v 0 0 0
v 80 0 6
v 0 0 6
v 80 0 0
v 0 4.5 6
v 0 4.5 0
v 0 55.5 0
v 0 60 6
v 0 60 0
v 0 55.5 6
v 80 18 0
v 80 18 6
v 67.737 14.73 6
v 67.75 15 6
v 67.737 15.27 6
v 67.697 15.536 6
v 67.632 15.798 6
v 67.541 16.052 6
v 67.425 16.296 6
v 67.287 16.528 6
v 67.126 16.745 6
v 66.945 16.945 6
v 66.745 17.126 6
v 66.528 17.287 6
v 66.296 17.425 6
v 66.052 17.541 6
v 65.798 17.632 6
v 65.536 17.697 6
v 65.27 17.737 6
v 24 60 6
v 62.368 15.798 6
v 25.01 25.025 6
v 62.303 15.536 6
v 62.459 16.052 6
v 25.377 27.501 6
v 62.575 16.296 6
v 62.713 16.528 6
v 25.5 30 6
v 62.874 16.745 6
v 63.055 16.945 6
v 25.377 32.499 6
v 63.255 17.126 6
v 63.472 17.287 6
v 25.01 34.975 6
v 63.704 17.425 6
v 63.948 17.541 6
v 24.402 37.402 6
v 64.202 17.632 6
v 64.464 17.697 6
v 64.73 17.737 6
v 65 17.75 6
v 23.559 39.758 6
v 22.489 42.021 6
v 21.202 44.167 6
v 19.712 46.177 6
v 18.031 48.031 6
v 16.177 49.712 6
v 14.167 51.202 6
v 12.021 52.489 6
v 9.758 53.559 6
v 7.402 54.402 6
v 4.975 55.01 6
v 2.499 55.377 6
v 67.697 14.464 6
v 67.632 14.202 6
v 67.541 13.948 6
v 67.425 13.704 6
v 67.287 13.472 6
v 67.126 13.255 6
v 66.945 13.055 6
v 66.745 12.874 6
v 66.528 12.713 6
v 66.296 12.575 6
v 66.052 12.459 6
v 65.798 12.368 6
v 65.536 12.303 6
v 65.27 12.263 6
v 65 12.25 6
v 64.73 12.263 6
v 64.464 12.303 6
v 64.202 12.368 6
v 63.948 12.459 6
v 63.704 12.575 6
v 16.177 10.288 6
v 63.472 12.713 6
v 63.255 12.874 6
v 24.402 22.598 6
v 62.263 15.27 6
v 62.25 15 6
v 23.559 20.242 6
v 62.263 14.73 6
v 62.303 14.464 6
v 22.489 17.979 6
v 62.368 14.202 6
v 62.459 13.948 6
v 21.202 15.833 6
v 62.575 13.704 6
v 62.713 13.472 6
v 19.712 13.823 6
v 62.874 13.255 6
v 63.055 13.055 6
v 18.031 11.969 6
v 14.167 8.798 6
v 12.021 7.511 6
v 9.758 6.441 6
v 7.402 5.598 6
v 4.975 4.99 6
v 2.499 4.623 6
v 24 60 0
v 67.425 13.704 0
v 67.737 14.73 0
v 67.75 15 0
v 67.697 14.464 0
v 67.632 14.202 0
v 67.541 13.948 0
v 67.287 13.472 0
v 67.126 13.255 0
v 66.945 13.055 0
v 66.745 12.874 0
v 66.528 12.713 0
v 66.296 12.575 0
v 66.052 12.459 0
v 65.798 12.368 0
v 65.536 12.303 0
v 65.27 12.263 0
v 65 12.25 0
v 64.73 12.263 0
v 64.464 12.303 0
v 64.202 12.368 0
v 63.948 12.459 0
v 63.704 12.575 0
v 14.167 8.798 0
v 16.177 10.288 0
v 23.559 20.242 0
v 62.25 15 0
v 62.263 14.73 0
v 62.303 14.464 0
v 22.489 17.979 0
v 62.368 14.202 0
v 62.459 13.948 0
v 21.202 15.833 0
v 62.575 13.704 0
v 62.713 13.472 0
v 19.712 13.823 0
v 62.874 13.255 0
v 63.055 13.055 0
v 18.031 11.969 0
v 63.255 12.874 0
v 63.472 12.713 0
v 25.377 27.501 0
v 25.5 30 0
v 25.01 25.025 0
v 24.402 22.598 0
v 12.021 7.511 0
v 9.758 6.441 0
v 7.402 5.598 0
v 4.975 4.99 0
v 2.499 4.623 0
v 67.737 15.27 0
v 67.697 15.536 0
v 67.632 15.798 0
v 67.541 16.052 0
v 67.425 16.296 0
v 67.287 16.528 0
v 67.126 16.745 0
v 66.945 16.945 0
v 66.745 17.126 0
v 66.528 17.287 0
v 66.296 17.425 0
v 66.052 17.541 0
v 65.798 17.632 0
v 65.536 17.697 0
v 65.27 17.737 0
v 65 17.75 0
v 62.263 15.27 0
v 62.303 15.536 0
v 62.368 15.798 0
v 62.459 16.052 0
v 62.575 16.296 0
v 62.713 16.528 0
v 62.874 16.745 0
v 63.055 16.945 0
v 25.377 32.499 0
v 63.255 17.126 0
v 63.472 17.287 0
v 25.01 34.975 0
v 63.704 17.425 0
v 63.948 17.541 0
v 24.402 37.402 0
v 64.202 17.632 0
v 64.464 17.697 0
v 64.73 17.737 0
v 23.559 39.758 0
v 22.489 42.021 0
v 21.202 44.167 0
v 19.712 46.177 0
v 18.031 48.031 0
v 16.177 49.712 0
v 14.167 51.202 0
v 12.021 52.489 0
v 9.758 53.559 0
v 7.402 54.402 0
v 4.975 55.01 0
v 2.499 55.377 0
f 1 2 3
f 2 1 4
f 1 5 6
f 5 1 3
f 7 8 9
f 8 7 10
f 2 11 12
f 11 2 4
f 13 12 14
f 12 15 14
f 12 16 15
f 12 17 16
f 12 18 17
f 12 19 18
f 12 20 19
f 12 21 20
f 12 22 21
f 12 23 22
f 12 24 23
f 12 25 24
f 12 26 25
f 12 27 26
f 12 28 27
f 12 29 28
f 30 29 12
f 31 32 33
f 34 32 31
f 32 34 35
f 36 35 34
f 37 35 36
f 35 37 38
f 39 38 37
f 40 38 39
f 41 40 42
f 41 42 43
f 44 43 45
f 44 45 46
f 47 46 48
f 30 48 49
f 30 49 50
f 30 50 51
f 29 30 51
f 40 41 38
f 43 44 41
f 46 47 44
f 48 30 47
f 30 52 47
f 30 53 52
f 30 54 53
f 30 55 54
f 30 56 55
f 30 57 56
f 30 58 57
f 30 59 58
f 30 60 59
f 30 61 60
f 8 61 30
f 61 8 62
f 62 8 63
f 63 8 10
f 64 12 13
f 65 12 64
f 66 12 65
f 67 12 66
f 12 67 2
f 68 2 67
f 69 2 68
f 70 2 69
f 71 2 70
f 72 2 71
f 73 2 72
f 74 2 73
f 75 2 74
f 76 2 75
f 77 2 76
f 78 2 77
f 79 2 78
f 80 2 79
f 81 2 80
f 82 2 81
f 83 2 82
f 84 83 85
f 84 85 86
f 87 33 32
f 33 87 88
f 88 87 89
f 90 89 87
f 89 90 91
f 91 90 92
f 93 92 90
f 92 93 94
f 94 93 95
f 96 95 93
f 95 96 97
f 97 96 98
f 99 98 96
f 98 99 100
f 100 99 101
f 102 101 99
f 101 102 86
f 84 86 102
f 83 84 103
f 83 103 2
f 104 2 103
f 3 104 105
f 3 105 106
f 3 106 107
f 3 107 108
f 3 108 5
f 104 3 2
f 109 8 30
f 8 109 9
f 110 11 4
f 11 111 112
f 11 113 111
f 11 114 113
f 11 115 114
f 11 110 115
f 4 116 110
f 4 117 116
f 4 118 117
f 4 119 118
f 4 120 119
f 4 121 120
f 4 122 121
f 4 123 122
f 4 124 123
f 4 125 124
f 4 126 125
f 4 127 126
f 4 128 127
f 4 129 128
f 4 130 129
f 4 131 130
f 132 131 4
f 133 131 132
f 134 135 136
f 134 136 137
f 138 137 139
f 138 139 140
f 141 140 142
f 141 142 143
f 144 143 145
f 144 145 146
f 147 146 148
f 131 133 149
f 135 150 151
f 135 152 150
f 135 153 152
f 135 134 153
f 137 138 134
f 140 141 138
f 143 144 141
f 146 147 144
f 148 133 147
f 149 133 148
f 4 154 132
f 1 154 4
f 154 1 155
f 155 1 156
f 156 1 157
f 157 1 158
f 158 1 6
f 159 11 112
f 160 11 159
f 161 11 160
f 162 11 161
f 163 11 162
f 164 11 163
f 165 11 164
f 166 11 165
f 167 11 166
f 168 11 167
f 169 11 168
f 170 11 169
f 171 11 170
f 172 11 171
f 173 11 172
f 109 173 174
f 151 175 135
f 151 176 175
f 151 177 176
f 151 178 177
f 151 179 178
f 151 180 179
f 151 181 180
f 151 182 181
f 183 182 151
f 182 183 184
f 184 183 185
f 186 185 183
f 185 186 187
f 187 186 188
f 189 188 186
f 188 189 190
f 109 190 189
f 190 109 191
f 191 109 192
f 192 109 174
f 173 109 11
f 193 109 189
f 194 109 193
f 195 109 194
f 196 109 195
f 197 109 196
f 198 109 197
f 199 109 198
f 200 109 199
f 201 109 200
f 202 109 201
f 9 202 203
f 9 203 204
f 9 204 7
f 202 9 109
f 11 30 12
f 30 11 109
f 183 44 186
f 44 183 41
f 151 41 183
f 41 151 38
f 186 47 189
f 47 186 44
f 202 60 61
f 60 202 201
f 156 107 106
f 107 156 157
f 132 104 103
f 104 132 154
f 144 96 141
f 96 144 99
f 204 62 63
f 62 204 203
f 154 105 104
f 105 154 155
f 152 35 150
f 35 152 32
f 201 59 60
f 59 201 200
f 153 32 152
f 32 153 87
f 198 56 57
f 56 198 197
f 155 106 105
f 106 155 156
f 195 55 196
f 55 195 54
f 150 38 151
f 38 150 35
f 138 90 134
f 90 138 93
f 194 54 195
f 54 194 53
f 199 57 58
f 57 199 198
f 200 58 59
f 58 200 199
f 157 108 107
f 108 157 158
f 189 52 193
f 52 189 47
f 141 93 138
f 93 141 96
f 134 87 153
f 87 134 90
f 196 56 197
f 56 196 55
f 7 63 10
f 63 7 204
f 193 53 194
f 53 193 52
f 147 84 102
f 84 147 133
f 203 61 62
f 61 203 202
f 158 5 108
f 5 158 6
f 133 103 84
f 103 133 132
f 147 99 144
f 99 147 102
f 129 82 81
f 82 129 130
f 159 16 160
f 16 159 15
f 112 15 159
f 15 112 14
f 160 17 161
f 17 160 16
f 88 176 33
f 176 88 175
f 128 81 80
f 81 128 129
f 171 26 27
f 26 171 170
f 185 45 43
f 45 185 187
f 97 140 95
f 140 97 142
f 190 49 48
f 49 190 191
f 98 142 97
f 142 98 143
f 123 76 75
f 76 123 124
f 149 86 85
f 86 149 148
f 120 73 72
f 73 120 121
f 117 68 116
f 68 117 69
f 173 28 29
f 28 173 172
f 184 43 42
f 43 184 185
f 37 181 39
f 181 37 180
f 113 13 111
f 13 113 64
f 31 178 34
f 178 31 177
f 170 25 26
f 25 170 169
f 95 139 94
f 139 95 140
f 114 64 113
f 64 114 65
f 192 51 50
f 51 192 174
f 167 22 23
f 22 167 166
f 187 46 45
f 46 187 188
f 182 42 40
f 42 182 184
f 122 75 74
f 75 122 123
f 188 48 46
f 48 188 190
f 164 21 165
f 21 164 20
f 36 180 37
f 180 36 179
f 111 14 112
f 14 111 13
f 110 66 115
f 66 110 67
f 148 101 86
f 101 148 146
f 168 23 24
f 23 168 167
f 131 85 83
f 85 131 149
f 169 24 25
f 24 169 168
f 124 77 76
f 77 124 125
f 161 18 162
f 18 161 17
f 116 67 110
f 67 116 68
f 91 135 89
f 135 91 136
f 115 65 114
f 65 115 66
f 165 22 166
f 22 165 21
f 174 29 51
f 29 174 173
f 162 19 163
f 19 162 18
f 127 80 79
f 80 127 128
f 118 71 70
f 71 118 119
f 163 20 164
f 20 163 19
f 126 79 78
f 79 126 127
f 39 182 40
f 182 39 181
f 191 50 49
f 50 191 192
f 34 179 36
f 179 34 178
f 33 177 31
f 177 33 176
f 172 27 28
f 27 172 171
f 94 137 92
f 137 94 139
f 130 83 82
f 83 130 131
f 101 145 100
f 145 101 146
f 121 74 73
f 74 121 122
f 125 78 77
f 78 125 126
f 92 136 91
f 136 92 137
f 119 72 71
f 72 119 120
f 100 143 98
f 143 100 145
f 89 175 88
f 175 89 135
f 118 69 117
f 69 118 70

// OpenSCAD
// file: ../../config.scad
// Ebike Configuration
// All dimensions in mm

// =============================================================================
// RIDER PARAMETERS
// =============================================================================
rider_height = 173;
rider_weight = 55;

// =============================================================================
// FRAME GEOMETRY
// =============================================================================
frame_size = 520;                    // Seat tube center-to-top
top_tube_effective = 545;
head_tube_length = 140;
head_tube_angle = 70;
seat_tube_angle = 72;
chainstay_length = 460;
bb_drop = 65;
wheelbase = 1080;
standover_height = 450;              // Step-through
stack = 620;
reach = 370;

// =============================================================================
// TUBE DIAMETERS
// =============================================================================
head_tube_id = 44;                   // 1-1/8" straight steerer
head_tube_od = 49;
seat_tube_id = 27.2;                 // Standard seatpost
down_tube_od = 44;
top_tube_od = 32;
seat_stay_od = 16;
chainstay_od = 22;

// =============================================================================
// MOTOR CONFIGURATION
// =============================================================================
motor_type = "mid-drive";
bb_shell_width = 68;                 // BSA standard
bb_clearance_width = 120;

// =============================================================================
// DROPOUT PARAMETERS
// =============================================================================
dropout_material = "6061-T6";
dropout_thickness = 10;
dropout_width = 45;
dropout_height = 80;
dropout_axle_spacing = 142;          // Boost thru-axle
dropout_axle_diameter = 12;

// =============================================================================
// BOTTOM BRACKET SHELL
// =============================================================================
bb_shell_od = 42;
bb_shell_id = 34.8;                  // BSA threaded
bb_thread_tpi = 24;                  // BSA 1.37" x 24 TPI

// =============================================================================
// HEAD TUBE
// =============================================================================
// Uses head_tube_length, head_tube_id, head_tube_od from above

// =============================================================================
// SEAT COLLAR
// =============================================================================
seat_collar_id = 31.8;               // For 27.2mm post with shim
seat_collar_od = 38;
seat_collar_height = 25;

// =============================================================================
// MOTOR MOUNT
// =============================================================================
motor_mount_thickness = 8;
motor_mount_width = 120;
motor_mount_height = 100;

// =============================================================================
// BATTERY MOUNT
// =============================================================================
battery_mount_thickness = 6;
battery_mount_width = 60;
battery_mount_height = 40;
battery_mount_quantity = 4;

// =============================================================================
// BRAKE MOUNT (Post Mount)
// =============================================================================
brake_mount_thickness = 10;
brake_mount_width = 80;
brake_mount_height = 50;
brake_post_bolt_spacing = 74;        // Post mount standard
brake_rotor_size_front = 180;
brake_rotor_size_rear = 160;

// =============================================================================
// CABLE GUIDES
// =============================================================================
cable_guide_length = 25;
cable_guide_width = 15;
cable_guide_height = 8;
cable_guide_quantity = 6;

// =============================================================================
// HEADSET CUPS
// =============================================================================
headset_cup_od = 44;
headset_bearing_seat = 30;

// =============================================================================
// RACK/FENDER MOUNTS
// =============================================================================
rack_mount_length = 30;
rack_mount_width = 20;
rack_mount_height = 10;
rack_mount_thread = 5;               // M5
rack_mount_quantity = 4;

// =============================================================================
// GUSSET PLATES
// =============================================================================
gusset_thickness = 6;
gusset_width = 80;
gusset_height = 60;
gusset_quantity = 2;

// =============================================================================
// COMPOSITE FRAME TUBES (FibreSeeker 3)
// =============================================================================
// Wall thickness for carbon fiber reinforced tubes
tube_wall_thickness = 3;

// Down tube (curved for step-through)
down_tube_length = 650;              // Along curve
down_tube_curve_radius = 800;        // Radius of curve

// Seat tube
seat_tube_length = 520;              // frame_size
seat_tube_od = 34;                   // Outer diameter

// Chainstays
chainstay_wall = 2.5;

// Seat stays
seat_stay_length = 480;
seat_stay_wall = 2;

// =============================================================================
// TUBE SECTIONING (for build volume constraints)
// =============================================================================
// Joint design: internal aluminum sleeve with M6 through-bolts
joint_overlap = 30;                  // Overlap length per joint
joint_bolt_diameter = 6;             // M6 bolts
joint_bolt_count = 2;                // Bolts per joint

// Section counts
down_tube_sections = 3;
seat_tube_sections = 2;
chainstay_sections = 2;
seat_stay_sections = 2;

// Sleeve parameters (CNC milled aluminum)
sleeve_wall_thickness = 2;
sleeve_length = 60;                  // Total sleeve length (2x overlap)

// =============================================================================
// MANUFACTURING TOLERANCES
// =============================================================================
tolerance_press_fit = 0.05;
tolerance_general = 0.1;

// =============================================================================
// COMMON CONSTANTS
// =============================================================================
$fn = 64;                            // Circle resolution
epsilon = 0.01;                      // For boolean operations
// main file
// Head Tube Gusset Plate
// CNC milled component for NestWorks C500
// Reinforces head tube junction for step-through frame

include <../../config.scad>

module gusset_plate() {
    difference() {
        // Triangular gusset shape
        linear_extrude(height = gusset_thickness) {
            polygon(points = [
                [0, 0],
                [gusset_width, 0],
                [gusset_width, gusset_height * 0.3],
                [gusset_width * 0.3, gusset_height],
                [0, gusset_height]
            ]);
        }

        // Head tube clearance
        translate([0, gusset_height/2, -epsilon])
            cylinder(h = gusset_thickness + 2*epsilon, d = head_tube_od + 2);

        // Mounting holes (M5)
        translate([gusset_width - 15, 15, -epsilon])
            cylinder(h = gusset_thickness + 2*epsilon, d = 5.5);
        translate([15, gusset_height - 15, -epsilon])
            cylinder(h = gusset_thickness + 2*epsilon, d = 5.5);
    }
}

// Render for preview
gusset_plate();
